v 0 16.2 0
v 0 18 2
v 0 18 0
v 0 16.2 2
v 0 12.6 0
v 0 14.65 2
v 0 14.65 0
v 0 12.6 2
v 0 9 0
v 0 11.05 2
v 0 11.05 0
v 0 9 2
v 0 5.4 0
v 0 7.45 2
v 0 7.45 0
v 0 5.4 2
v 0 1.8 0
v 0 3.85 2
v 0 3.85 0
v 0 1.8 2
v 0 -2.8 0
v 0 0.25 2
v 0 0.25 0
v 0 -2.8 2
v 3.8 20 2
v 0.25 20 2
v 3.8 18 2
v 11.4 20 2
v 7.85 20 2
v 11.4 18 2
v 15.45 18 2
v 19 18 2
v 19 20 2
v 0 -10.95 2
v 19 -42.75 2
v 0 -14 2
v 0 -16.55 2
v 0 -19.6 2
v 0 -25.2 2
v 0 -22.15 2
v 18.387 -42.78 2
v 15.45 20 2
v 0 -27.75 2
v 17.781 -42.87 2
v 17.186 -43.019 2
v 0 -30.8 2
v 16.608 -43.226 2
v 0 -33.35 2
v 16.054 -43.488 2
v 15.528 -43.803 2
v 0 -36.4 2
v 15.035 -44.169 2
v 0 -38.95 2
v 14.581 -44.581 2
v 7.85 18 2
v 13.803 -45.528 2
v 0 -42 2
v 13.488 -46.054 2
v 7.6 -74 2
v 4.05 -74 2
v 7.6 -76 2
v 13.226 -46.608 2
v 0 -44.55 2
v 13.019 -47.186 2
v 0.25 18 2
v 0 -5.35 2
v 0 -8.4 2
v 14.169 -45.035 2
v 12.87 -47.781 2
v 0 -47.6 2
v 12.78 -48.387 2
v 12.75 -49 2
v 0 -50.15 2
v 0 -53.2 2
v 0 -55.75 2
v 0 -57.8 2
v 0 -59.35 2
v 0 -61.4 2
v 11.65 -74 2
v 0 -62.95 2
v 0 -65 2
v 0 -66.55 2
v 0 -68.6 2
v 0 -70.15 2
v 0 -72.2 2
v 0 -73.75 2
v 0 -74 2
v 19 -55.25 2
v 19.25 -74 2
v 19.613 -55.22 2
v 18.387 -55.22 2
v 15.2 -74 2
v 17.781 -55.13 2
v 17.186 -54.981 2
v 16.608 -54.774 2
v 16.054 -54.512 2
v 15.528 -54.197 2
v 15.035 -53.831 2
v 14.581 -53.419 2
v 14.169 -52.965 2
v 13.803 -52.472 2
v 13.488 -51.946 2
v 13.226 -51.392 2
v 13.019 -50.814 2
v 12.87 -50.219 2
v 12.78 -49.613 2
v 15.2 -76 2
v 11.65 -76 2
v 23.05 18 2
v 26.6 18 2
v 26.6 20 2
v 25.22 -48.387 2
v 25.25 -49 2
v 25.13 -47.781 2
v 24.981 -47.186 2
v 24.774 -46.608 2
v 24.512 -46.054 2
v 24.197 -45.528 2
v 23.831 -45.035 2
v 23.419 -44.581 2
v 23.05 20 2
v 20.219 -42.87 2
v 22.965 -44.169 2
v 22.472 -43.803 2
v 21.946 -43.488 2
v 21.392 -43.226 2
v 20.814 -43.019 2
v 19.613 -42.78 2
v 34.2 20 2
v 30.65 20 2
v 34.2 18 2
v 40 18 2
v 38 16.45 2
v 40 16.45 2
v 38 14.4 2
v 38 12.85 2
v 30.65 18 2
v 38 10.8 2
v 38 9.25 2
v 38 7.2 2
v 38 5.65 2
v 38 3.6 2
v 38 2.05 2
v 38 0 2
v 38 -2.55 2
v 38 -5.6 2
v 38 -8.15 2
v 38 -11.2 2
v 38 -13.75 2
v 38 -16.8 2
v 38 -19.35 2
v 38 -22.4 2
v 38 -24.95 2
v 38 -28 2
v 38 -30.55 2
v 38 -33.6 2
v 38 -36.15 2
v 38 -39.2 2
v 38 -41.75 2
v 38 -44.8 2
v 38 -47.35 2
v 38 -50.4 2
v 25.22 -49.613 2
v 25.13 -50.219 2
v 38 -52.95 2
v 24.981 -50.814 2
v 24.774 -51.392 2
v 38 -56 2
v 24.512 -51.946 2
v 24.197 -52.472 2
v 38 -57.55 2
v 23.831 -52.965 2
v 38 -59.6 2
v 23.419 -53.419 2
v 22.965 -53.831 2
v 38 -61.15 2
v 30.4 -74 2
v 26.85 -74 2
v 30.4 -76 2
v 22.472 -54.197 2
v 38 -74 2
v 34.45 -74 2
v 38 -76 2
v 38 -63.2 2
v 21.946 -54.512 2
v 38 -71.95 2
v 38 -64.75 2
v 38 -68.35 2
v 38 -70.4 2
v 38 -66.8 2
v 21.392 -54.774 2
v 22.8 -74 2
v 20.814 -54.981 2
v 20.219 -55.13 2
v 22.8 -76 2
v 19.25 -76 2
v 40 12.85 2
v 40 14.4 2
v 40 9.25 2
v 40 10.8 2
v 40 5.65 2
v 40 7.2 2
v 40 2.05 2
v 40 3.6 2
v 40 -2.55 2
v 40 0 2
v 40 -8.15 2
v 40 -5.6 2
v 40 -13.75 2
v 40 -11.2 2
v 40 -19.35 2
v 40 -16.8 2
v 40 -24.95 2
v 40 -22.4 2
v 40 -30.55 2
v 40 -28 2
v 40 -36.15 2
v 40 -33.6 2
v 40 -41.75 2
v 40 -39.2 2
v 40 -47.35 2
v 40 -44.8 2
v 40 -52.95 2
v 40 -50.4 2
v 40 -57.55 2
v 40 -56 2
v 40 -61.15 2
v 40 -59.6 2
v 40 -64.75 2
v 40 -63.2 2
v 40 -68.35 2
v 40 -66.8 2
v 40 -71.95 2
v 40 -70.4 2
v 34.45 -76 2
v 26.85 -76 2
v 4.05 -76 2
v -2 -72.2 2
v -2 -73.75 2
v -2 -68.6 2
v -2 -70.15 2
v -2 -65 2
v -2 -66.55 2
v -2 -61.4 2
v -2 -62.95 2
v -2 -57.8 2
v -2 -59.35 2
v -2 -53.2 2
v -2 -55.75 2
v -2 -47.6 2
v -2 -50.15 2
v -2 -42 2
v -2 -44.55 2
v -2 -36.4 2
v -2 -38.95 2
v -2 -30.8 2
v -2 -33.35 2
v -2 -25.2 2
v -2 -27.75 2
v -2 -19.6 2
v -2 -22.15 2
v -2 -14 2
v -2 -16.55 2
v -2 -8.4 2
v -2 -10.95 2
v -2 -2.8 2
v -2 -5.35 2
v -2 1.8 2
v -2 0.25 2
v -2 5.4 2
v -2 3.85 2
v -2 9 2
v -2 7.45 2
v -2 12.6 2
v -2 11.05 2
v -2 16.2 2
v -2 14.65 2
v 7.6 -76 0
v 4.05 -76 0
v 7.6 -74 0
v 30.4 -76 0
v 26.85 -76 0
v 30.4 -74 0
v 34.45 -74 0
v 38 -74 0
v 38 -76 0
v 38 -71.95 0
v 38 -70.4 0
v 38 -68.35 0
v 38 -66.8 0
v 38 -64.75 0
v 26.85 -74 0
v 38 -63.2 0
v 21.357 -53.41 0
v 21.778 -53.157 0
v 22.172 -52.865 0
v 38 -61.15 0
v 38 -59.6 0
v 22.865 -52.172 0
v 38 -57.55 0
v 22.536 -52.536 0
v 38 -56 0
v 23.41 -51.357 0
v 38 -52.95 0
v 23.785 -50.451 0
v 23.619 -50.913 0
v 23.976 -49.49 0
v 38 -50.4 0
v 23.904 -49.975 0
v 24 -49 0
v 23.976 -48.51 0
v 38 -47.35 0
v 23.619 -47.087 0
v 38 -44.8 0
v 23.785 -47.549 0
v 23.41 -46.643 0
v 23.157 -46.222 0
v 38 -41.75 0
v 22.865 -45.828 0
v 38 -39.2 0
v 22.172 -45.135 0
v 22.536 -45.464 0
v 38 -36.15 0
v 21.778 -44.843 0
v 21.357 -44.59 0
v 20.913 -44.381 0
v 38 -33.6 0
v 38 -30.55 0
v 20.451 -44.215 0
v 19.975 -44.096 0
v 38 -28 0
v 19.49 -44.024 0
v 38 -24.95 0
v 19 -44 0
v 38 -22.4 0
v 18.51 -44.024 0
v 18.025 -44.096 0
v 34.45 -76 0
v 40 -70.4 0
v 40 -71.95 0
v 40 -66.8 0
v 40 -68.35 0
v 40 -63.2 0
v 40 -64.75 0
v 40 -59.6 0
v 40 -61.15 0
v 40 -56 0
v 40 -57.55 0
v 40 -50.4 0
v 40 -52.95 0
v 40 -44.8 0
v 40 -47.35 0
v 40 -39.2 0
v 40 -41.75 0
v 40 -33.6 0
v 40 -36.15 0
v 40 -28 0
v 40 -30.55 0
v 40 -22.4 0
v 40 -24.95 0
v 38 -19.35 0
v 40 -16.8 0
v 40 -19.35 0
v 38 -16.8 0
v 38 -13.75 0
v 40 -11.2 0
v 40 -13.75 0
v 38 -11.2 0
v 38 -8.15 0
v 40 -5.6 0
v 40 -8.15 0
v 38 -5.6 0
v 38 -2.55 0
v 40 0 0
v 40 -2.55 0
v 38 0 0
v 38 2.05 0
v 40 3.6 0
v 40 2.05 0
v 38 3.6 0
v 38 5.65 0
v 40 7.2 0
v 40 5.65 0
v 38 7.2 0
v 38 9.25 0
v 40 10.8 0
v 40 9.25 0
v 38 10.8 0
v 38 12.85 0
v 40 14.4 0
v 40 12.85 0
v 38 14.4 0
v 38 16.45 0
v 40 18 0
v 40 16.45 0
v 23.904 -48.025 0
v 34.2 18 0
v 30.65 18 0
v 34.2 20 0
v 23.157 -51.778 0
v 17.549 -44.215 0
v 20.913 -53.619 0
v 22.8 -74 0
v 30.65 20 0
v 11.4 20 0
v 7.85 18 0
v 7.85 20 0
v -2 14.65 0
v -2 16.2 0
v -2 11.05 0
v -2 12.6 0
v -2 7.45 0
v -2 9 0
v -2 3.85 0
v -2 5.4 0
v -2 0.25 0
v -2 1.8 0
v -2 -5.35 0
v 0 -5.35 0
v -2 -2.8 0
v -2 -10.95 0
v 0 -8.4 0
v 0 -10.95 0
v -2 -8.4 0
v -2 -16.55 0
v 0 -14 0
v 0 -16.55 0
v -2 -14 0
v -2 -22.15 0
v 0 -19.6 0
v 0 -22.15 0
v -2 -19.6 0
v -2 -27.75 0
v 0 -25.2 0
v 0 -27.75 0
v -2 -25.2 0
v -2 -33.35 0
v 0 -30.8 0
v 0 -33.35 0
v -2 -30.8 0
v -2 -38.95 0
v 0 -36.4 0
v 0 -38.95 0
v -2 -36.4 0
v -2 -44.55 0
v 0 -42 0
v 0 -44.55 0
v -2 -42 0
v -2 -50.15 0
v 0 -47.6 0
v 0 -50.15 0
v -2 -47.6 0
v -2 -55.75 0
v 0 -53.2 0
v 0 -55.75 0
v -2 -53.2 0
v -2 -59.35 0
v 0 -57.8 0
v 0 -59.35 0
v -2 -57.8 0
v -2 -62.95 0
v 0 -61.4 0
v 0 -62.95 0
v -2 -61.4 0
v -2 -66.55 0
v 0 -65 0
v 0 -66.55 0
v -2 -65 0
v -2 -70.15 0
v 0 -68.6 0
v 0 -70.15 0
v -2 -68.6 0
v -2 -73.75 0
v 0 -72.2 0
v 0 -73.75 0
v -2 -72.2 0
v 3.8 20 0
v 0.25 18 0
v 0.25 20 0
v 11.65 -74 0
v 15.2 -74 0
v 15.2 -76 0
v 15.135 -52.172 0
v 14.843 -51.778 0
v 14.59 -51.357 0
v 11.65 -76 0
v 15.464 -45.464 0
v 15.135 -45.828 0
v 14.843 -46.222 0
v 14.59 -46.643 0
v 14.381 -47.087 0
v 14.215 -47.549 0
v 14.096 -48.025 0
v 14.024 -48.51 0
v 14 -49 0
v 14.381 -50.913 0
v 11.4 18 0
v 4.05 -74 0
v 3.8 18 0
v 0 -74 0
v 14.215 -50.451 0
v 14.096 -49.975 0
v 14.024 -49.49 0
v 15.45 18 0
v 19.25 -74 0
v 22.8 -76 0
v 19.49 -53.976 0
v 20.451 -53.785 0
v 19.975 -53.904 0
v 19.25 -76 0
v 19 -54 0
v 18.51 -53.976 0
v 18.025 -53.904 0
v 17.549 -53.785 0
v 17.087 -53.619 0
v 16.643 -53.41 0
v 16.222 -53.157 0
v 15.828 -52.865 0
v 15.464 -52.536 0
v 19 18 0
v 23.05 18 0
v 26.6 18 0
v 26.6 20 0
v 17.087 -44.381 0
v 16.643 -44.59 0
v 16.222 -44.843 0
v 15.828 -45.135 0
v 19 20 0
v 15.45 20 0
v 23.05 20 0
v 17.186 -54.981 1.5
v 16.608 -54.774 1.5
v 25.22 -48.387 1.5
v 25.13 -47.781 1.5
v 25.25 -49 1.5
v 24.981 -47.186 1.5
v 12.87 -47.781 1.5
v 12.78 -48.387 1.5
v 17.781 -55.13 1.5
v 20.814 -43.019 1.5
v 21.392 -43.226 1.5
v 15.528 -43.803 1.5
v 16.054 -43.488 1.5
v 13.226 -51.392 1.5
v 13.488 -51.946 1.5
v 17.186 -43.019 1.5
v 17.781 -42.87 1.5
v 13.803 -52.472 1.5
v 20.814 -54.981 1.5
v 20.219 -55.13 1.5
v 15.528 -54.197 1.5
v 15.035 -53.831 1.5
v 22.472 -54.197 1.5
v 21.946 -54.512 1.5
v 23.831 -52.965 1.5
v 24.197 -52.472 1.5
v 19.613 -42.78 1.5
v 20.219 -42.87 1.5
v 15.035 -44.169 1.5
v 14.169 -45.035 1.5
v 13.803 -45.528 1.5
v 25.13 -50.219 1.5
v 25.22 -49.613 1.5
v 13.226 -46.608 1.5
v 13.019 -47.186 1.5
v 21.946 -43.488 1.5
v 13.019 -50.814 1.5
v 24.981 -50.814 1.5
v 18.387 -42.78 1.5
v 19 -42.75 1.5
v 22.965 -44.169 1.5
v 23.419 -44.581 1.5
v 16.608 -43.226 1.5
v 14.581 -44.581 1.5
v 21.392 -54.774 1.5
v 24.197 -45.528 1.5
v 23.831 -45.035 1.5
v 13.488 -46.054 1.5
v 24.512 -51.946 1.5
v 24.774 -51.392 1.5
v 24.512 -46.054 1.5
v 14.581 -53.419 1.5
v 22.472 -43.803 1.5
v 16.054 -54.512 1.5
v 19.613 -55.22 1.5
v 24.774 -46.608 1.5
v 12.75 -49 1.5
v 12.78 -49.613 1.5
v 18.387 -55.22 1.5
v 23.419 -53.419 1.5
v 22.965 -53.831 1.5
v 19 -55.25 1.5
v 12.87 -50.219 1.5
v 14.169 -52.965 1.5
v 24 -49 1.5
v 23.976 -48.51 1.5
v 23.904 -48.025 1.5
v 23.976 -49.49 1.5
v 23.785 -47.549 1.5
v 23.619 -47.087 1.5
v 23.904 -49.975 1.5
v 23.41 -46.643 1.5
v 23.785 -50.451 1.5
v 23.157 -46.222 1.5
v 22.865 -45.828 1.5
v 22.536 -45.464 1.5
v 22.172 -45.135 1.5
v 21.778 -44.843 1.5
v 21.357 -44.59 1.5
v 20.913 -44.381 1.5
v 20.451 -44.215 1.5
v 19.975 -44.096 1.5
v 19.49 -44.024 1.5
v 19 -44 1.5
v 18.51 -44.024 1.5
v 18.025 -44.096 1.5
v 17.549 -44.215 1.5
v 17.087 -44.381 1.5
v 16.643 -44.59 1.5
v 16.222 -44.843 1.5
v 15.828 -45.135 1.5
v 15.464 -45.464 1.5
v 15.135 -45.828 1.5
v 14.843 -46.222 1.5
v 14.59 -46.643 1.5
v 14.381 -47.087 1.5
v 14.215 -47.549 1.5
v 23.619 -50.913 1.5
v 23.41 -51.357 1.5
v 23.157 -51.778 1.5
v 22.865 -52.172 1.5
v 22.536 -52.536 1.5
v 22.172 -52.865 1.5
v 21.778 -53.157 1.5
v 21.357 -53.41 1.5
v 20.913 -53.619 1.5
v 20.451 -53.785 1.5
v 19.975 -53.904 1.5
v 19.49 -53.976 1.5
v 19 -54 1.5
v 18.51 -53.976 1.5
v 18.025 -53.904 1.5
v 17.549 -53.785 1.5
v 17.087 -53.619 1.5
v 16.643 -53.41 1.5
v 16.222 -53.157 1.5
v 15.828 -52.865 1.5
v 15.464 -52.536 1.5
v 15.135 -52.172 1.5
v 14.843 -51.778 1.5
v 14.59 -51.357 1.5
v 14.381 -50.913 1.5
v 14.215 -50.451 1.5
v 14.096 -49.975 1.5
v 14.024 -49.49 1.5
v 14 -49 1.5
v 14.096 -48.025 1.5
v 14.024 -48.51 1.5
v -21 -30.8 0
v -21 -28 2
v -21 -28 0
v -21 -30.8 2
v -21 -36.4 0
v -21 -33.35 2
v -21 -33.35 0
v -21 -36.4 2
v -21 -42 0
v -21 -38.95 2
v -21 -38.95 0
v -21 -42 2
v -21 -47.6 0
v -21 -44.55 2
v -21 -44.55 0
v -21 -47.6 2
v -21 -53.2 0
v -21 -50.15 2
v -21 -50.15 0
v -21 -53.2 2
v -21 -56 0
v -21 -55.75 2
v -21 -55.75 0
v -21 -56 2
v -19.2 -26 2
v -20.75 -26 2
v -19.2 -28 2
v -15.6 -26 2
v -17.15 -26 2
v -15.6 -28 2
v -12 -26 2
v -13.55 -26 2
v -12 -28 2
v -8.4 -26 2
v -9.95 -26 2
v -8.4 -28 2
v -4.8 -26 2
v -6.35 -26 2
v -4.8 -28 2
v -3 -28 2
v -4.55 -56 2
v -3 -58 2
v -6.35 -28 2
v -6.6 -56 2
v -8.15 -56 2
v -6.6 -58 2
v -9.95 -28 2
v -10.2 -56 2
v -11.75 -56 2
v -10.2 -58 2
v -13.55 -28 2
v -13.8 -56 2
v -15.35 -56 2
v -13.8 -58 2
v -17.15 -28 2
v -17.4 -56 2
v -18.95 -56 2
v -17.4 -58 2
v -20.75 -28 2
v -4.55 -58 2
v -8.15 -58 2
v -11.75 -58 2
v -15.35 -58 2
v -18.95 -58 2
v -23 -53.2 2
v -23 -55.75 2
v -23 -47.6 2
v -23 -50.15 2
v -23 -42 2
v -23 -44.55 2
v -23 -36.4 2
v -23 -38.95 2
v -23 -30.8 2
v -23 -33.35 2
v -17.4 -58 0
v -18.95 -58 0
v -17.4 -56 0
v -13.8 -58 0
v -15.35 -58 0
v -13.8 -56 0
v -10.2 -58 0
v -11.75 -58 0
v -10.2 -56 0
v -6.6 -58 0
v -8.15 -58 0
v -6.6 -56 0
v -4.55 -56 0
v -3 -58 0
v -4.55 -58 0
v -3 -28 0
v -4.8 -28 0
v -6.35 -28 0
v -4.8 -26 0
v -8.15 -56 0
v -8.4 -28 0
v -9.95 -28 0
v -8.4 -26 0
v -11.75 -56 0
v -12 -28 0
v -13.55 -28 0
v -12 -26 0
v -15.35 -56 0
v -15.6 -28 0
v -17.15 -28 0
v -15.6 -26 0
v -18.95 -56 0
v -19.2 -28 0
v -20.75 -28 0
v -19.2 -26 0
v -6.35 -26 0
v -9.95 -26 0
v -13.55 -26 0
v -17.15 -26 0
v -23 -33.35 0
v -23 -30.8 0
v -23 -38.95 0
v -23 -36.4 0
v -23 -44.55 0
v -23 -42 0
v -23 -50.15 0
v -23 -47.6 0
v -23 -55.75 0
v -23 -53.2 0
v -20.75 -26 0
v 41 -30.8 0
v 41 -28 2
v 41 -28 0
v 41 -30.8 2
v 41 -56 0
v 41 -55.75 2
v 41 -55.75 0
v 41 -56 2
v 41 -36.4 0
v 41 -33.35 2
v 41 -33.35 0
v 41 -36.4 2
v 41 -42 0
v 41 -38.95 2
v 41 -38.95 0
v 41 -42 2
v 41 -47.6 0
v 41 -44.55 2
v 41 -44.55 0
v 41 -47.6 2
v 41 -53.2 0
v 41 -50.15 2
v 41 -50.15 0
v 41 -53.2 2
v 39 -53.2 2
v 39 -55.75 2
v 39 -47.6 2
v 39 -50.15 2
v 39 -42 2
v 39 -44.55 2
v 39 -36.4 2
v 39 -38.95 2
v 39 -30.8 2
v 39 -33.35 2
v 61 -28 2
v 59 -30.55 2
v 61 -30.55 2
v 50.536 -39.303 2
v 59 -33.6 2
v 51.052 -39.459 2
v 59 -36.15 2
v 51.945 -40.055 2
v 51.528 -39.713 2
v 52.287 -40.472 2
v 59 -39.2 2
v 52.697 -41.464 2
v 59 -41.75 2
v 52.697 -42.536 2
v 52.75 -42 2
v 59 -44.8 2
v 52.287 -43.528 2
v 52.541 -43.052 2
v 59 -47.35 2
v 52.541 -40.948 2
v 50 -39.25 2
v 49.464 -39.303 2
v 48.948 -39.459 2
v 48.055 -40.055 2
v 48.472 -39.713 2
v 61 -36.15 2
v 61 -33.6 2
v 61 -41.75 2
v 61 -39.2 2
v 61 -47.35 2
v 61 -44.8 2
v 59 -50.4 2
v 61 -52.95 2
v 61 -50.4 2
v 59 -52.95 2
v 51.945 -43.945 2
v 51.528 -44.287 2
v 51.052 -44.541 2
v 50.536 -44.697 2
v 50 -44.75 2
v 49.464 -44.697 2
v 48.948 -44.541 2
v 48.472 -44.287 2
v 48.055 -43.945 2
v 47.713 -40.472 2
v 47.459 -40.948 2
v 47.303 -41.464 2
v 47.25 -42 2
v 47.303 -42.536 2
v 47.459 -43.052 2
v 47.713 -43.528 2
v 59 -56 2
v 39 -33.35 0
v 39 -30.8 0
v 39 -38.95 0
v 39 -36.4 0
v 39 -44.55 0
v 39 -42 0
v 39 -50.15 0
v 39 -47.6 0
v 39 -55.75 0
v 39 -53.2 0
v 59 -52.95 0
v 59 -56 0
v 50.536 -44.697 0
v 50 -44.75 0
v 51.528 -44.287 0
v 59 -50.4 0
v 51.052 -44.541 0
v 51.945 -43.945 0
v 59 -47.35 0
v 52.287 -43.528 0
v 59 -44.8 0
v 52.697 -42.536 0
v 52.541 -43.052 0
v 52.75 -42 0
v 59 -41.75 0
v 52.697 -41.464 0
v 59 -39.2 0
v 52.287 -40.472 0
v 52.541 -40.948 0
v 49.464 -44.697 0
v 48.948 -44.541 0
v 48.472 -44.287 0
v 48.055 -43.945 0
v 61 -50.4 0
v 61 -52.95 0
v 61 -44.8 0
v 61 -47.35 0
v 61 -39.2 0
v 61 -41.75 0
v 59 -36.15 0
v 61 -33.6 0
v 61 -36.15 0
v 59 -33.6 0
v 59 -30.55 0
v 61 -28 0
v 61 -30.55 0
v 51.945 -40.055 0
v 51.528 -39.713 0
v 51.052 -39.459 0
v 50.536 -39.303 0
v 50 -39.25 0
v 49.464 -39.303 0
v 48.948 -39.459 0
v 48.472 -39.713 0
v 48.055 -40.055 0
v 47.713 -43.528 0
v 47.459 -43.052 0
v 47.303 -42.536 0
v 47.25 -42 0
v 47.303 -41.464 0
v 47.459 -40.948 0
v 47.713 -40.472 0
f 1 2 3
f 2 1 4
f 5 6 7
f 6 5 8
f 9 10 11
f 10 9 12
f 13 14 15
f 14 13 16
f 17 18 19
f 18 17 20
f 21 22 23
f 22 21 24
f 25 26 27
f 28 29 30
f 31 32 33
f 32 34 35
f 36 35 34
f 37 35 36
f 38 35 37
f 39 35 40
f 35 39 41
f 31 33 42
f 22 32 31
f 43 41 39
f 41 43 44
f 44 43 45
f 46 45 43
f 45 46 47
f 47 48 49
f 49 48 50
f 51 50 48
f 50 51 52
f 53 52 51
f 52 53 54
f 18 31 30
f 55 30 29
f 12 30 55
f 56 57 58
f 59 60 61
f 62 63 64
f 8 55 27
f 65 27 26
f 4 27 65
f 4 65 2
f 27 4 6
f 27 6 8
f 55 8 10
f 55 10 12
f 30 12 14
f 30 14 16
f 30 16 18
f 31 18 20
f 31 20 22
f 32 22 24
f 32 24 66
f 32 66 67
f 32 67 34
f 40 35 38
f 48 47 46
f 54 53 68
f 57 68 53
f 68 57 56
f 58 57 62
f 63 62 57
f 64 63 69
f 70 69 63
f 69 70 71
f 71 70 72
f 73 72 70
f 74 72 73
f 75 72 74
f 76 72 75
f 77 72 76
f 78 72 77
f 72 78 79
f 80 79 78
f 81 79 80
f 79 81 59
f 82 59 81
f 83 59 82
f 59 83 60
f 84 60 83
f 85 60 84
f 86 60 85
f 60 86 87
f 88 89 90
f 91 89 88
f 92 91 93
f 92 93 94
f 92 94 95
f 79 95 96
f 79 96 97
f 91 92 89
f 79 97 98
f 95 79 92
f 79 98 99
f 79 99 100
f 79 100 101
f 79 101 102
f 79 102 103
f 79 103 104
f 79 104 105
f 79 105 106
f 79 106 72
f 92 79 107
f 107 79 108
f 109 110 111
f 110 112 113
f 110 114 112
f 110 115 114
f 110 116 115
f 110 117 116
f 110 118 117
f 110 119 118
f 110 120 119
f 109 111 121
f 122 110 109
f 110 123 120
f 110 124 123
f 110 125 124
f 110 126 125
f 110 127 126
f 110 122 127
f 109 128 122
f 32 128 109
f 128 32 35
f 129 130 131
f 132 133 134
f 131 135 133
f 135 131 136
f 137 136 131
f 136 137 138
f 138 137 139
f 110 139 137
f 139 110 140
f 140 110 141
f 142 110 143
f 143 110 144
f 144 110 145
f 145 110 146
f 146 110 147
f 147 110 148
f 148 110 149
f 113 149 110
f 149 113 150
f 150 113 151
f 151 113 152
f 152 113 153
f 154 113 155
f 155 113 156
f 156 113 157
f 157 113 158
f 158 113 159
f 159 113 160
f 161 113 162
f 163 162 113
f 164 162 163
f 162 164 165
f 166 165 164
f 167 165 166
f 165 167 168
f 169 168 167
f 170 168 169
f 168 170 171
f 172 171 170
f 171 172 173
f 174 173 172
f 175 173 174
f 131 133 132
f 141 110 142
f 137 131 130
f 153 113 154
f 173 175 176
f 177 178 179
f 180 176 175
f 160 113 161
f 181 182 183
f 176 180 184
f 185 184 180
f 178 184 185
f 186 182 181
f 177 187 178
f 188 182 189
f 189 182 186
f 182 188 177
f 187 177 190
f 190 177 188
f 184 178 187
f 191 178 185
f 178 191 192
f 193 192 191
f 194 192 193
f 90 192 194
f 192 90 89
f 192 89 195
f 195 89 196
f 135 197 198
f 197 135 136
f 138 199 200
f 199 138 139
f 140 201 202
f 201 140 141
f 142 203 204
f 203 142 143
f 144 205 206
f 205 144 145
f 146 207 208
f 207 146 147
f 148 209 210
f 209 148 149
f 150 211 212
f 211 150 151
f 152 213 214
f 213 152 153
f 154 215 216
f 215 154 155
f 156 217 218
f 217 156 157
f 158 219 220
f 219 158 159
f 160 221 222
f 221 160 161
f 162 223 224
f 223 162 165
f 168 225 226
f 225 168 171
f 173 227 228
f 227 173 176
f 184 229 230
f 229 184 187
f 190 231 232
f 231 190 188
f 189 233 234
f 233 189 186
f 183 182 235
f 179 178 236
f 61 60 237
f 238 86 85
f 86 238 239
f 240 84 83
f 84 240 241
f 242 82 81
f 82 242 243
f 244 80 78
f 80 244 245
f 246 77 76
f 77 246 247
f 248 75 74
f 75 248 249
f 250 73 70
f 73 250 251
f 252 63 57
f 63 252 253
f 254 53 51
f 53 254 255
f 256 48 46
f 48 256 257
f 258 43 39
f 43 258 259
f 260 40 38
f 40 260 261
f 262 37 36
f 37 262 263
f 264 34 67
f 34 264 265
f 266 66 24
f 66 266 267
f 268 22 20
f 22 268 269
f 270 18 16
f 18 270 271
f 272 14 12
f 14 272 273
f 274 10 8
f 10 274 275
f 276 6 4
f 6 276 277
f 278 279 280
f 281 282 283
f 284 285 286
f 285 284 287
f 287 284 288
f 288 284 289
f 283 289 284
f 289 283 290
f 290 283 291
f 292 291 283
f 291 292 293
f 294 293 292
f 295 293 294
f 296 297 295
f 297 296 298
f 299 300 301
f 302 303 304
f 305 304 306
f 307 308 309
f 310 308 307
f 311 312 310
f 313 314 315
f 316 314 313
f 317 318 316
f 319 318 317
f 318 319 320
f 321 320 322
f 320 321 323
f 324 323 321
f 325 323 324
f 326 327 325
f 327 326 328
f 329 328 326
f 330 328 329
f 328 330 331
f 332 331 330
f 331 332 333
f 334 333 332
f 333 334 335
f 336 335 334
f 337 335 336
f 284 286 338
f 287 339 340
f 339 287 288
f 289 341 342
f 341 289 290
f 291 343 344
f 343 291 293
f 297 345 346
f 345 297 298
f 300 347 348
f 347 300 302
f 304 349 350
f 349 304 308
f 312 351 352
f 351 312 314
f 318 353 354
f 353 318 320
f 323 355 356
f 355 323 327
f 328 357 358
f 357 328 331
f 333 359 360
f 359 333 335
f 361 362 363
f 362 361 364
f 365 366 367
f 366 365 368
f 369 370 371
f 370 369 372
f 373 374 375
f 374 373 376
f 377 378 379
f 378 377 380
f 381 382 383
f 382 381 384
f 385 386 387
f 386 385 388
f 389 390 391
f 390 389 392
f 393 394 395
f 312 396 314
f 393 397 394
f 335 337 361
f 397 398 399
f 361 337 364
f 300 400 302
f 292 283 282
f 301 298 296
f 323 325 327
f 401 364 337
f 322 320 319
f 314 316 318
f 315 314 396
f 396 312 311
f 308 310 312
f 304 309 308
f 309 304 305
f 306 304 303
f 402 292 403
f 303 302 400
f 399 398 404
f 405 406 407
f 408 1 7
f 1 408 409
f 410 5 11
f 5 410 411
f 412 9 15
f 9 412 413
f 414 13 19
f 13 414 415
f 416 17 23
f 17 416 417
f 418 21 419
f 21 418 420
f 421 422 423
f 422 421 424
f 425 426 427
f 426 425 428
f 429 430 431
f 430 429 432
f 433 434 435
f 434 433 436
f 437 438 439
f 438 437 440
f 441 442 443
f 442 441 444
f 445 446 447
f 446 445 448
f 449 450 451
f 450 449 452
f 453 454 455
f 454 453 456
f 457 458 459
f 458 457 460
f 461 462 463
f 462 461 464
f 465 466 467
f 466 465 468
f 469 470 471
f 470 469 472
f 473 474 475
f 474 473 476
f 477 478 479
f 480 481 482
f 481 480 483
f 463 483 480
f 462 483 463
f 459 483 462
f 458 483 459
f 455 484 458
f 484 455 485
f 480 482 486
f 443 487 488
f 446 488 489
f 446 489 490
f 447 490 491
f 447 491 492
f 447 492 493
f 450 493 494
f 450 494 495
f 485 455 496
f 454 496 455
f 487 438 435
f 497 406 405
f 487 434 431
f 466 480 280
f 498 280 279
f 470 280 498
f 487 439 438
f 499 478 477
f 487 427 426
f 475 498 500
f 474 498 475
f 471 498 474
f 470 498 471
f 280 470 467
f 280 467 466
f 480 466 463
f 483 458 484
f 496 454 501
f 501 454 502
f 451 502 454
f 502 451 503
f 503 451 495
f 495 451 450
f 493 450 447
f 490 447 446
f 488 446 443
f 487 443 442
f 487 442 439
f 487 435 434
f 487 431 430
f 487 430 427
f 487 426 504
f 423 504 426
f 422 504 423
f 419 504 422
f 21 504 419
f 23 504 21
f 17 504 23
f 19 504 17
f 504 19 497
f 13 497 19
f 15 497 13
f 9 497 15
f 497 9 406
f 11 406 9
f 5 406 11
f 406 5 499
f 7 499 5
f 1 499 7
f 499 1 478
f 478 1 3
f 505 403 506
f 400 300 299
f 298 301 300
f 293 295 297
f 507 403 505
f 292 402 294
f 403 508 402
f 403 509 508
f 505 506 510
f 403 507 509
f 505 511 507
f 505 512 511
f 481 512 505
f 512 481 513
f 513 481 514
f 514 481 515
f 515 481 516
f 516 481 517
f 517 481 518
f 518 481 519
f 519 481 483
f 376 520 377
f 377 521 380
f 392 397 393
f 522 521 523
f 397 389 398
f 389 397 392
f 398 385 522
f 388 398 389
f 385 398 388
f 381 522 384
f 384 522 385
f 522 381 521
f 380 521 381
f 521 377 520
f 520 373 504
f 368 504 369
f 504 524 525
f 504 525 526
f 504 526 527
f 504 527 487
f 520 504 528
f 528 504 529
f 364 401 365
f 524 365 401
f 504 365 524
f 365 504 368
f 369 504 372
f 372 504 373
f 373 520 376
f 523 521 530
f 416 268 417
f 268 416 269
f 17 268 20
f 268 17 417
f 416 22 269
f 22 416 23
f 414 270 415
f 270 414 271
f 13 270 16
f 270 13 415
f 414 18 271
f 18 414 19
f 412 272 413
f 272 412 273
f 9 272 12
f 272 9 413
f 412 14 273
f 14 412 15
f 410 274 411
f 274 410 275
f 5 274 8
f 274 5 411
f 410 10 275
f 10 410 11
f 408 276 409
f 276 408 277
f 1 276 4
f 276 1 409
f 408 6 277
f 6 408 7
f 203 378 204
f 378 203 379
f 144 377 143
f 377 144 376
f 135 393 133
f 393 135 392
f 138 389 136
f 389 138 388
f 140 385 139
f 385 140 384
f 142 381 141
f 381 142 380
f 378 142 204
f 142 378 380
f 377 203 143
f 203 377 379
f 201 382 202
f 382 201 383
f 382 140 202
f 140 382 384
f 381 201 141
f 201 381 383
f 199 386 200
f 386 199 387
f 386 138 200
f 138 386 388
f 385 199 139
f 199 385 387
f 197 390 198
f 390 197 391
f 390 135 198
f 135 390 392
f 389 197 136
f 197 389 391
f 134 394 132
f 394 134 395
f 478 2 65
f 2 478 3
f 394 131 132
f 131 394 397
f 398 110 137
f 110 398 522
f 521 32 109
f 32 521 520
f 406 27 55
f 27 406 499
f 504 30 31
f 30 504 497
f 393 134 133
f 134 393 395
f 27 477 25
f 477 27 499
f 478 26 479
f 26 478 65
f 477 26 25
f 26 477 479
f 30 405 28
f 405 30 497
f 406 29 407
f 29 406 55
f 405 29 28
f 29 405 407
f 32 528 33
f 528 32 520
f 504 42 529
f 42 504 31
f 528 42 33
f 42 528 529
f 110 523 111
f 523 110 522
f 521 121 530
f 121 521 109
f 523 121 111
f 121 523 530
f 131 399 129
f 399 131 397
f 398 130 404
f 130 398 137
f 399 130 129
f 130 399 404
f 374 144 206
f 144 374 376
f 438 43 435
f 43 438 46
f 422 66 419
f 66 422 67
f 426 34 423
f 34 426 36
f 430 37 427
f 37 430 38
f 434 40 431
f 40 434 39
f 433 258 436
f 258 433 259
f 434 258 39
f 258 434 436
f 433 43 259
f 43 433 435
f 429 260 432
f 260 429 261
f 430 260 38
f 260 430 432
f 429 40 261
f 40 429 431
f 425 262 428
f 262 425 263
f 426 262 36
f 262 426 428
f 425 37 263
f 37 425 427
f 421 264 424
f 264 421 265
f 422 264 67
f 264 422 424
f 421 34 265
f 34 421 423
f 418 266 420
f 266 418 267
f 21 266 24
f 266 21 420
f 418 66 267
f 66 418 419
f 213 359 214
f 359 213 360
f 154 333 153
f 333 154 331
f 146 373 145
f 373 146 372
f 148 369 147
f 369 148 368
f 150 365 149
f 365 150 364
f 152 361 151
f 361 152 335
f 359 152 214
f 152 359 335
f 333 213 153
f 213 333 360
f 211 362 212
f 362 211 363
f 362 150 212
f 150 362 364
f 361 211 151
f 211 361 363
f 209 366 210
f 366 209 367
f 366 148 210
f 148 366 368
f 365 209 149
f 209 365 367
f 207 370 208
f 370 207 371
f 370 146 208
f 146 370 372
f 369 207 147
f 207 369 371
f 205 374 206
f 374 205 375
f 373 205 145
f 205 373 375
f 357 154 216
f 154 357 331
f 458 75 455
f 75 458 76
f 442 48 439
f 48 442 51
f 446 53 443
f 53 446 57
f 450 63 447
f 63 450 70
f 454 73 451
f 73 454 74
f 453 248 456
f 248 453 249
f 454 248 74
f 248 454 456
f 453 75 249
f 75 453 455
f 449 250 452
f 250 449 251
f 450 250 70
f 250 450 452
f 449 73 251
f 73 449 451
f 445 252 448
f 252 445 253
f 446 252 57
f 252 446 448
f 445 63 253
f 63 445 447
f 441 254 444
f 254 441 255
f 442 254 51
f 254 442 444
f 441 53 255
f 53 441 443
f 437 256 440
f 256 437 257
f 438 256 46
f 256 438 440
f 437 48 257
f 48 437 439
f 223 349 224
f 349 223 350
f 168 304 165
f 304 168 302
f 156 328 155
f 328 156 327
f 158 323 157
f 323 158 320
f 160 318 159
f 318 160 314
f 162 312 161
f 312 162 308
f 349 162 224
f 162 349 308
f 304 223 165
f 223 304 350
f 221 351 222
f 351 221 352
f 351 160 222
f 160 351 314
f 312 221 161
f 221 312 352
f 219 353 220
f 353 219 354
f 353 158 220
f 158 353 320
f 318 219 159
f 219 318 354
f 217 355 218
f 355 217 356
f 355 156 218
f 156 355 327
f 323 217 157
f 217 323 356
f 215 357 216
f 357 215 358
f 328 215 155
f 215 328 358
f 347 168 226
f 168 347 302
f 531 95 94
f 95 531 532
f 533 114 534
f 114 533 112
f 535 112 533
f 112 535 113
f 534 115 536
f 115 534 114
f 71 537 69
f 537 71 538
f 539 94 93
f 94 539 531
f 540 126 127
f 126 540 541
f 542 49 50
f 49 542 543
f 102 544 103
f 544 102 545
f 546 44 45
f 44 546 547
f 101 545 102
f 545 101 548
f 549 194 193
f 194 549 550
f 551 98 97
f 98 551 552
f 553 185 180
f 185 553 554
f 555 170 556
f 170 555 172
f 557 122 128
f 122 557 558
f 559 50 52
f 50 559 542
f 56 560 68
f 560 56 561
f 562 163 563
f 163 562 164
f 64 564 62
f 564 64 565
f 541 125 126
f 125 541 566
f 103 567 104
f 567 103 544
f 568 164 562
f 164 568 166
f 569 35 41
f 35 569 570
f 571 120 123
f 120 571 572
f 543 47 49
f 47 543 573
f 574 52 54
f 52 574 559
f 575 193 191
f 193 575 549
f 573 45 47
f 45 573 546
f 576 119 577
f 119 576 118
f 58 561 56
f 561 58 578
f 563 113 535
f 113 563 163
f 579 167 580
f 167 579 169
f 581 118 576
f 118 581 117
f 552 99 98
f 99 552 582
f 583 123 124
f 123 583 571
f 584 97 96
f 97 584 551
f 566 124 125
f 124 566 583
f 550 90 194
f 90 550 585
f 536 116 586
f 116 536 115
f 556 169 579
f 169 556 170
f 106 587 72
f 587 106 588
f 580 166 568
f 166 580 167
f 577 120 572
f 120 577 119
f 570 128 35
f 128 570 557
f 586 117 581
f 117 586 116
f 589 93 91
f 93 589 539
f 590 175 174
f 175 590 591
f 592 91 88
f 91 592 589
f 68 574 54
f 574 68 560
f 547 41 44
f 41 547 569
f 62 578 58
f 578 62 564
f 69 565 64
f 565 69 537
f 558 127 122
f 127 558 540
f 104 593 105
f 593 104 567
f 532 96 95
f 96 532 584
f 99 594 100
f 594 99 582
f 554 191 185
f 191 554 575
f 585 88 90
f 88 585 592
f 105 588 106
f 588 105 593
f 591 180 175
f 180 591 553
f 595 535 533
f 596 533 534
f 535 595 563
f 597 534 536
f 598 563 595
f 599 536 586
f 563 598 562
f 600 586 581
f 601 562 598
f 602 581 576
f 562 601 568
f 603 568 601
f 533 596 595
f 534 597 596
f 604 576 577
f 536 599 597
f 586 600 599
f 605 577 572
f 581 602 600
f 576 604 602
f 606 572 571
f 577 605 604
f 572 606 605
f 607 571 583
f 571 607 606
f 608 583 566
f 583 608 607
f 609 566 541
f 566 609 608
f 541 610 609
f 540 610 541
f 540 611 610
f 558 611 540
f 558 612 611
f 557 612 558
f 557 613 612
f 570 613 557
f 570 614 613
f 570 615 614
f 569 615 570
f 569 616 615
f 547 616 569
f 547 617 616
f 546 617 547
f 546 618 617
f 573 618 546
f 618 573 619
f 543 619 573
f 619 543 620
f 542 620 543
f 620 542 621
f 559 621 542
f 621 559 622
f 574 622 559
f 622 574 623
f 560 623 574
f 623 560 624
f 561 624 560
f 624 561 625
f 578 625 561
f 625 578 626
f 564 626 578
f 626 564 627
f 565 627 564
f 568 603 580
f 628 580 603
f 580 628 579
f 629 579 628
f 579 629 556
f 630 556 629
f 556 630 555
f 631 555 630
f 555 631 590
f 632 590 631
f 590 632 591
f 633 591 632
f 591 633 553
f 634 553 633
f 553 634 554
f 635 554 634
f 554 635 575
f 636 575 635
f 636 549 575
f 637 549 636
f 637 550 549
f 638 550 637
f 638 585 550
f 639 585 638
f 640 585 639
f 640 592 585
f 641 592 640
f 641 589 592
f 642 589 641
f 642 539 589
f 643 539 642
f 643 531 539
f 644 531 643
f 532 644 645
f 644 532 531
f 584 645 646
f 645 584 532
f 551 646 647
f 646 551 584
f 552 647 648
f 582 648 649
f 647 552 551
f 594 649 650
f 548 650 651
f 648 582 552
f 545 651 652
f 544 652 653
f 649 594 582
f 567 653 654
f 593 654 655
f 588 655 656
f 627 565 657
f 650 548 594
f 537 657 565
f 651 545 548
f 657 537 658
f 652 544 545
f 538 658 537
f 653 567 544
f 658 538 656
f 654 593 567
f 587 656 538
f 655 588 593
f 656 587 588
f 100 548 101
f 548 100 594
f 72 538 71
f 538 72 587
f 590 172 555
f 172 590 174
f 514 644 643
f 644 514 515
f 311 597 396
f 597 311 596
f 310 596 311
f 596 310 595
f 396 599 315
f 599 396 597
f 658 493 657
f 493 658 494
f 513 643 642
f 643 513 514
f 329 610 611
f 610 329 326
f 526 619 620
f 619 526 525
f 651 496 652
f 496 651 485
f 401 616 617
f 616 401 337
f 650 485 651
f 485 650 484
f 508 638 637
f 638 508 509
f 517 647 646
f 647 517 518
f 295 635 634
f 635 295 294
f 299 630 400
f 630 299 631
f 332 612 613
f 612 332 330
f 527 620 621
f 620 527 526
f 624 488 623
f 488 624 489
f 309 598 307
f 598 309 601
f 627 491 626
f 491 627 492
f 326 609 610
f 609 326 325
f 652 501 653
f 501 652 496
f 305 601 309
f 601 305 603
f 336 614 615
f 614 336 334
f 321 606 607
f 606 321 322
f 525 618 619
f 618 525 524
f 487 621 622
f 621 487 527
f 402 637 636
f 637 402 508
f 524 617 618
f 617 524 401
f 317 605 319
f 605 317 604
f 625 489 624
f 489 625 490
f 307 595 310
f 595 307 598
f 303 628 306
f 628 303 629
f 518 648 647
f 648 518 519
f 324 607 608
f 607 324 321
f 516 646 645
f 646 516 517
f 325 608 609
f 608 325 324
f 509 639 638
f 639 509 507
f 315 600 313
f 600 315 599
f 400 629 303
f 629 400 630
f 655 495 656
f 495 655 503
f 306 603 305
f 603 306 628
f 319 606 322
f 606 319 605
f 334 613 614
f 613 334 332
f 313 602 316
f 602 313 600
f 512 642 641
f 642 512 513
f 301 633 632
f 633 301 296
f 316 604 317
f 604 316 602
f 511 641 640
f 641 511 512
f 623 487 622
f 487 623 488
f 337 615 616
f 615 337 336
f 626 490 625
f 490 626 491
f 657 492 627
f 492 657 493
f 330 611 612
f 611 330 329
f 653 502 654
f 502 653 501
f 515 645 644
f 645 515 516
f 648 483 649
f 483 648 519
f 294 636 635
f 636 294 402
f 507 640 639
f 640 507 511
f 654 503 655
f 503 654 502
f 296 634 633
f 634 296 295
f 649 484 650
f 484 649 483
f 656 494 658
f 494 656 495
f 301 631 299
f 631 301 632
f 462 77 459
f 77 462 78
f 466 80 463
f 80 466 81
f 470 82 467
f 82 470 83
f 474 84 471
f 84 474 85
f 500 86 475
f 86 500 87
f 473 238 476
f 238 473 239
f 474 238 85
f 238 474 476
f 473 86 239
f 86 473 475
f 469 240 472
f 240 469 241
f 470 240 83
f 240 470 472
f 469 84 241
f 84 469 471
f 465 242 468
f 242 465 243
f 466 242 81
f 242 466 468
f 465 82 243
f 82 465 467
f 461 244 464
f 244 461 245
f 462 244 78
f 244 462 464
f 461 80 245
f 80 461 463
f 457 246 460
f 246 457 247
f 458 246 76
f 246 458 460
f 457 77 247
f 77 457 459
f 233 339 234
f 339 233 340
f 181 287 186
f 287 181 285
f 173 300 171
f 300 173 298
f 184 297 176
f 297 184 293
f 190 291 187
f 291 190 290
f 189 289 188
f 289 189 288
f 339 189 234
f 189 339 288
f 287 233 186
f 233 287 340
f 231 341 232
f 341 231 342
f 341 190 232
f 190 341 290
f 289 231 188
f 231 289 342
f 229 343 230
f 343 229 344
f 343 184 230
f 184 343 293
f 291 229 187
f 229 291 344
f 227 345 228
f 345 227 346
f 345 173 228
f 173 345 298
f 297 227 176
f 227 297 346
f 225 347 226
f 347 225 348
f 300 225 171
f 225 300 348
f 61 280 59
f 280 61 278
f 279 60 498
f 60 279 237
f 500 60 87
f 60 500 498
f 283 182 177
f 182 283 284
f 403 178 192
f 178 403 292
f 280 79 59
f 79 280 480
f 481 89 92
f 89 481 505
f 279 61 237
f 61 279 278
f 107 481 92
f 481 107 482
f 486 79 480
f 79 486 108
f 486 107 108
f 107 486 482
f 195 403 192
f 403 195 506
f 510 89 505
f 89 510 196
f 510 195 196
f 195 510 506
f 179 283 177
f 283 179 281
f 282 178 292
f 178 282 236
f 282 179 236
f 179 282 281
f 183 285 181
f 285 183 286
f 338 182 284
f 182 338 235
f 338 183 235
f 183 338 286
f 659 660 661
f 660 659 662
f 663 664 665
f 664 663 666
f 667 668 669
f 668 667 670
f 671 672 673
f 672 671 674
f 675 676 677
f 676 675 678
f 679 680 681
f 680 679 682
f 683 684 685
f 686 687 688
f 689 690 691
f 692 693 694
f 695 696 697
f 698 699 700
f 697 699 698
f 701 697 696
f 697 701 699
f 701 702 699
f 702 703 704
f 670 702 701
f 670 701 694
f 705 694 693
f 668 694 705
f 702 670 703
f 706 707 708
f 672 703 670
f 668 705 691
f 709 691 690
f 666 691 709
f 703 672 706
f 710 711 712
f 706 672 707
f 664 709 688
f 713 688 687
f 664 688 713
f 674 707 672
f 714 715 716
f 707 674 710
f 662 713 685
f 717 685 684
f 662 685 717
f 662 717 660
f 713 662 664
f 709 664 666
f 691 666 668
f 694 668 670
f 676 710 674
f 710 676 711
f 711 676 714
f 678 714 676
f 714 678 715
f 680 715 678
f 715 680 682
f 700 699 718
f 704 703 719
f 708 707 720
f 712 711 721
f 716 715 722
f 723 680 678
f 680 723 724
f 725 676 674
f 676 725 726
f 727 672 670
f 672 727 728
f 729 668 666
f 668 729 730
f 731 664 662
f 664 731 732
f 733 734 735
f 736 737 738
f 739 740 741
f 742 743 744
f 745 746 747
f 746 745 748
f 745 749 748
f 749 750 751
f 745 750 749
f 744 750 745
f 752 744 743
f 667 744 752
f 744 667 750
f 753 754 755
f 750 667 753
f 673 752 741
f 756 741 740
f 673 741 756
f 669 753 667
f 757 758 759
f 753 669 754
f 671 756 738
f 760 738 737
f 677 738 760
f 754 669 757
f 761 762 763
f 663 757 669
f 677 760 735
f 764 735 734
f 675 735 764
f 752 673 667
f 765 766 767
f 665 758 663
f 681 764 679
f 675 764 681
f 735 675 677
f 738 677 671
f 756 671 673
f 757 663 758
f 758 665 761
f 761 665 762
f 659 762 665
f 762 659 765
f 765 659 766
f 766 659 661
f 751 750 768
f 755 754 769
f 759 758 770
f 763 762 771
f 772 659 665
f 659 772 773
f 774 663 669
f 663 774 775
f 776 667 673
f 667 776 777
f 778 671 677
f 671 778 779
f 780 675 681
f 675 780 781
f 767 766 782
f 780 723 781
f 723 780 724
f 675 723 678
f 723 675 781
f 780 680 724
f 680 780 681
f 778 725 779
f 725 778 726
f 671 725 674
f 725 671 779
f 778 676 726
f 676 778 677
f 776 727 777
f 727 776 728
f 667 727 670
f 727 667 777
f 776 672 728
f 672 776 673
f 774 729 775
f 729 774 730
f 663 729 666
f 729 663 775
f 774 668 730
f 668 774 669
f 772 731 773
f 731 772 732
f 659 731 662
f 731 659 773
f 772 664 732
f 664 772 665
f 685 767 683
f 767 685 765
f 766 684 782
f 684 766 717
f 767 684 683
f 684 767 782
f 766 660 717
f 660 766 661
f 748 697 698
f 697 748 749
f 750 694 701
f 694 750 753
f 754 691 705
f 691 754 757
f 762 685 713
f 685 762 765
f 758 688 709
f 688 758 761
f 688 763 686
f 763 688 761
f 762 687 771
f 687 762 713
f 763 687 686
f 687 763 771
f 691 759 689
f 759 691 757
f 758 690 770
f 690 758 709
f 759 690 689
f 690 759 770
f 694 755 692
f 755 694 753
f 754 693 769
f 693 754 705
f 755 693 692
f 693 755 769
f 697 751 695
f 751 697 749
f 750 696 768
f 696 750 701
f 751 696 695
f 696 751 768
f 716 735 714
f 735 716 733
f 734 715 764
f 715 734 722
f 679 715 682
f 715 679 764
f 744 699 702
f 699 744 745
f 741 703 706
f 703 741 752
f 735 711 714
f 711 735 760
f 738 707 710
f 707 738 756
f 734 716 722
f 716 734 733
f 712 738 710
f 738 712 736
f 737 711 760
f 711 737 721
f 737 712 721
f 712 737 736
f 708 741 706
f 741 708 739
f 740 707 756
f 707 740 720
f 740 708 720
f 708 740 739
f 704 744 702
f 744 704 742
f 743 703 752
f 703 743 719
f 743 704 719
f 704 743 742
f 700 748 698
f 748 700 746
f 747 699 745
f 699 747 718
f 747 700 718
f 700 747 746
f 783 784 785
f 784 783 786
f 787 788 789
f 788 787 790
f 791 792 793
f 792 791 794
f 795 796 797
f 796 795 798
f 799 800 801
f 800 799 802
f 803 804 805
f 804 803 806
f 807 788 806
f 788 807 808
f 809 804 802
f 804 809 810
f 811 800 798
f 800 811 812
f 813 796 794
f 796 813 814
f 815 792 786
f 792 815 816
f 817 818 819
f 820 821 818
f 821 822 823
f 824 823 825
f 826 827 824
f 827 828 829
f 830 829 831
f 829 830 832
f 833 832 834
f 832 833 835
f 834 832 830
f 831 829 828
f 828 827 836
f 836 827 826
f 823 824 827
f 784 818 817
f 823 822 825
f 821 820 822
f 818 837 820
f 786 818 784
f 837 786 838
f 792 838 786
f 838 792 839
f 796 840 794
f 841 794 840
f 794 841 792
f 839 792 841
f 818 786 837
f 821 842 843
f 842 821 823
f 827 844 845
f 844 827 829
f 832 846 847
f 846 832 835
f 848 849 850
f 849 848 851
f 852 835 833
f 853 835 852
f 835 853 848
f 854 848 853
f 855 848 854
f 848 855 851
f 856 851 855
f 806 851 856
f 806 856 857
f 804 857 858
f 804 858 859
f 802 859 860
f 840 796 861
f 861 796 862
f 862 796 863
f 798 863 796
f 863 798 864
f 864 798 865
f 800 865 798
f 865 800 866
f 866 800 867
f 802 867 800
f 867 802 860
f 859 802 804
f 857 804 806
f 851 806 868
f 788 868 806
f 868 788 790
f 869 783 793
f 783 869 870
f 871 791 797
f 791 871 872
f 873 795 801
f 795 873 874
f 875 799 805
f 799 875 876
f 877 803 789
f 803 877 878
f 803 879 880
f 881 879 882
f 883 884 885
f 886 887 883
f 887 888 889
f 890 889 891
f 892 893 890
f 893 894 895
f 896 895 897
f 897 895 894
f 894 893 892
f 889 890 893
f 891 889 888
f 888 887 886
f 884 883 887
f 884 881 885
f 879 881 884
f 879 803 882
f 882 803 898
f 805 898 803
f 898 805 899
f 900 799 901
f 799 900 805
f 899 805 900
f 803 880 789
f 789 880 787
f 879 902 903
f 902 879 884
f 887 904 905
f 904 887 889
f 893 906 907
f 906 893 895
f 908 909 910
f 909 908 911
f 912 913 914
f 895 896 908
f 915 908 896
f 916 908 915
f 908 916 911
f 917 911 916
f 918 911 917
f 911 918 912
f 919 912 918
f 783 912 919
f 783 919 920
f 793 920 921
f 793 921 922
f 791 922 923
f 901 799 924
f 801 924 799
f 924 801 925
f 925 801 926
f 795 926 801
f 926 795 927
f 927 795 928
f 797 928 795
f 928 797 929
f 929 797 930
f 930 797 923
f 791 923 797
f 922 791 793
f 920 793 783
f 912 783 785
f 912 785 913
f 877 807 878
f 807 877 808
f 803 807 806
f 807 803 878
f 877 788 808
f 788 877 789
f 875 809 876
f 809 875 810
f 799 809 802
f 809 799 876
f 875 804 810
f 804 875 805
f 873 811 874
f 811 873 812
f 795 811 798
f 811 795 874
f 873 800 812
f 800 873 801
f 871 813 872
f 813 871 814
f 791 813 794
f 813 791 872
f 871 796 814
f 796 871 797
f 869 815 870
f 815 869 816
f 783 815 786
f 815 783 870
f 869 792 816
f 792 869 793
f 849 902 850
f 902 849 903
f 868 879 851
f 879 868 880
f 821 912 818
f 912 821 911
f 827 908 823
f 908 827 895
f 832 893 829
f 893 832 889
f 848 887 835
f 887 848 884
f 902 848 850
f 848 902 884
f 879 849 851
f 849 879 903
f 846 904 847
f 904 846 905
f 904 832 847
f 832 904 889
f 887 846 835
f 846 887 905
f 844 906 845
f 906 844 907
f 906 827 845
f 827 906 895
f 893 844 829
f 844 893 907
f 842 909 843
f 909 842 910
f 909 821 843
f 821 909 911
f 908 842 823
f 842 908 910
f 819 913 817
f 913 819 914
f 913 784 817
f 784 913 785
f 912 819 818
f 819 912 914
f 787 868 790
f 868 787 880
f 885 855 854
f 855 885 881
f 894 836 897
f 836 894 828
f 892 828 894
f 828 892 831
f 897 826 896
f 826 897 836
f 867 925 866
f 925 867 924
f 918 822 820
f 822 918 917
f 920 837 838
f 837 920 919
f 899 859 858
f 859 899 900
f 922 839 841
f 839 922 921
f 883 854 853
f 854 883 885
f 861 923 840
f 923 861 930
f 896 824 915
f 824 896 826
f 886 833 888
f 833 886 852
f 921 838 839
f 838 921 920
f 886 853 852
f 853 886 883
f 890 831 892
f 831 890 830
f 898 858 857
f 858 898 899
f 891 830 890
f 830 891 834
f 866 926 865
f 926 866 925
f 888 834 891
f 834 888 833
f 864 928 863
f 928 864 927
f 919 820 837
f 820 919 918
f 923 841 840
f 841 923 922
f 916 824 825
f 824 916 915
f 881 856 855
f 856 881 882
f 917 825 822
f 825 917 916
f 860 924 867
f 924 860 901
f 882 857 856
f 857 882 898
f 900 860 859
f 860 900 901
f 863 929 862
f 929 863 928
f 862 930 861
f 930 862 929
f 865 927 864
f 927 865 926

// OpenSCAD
// Made by Claude. I, Richel, think it is quite a bad design :-/
//
// === Dimensions ===
outer_width     = 40; // mm  (X when assembled)
outer_depth     = 30; // mm  (Y when assembled)
outer_height    = 20; // mm  (Z when assembled)
wall_thickness  = 2;  // mm
inner_width     = outer_width  - wall_thickness;
inner_depth     = outer_depth  - wall_thickness;
inner_height    = outer_height - wall_thickness;

n_teeth         = 10;
teeth_air       = 0.25; // gap per tooth side, mm
piezo_diameter  = 12;   // mm
piezo_radius    = piezo_diameter / 2;
cable_diameter  = 5;    // mm
cable_radius    = cable_diameter / 2;

spacing         = 3;    // gap between unconnected panels in the flat layout

//
// Panel roles (assembled box):
//   1 = bottom   (has piezo cutout — glued first while flat, fully accessible)
//   2 = left side
//   3 = top
//   4 = right side (has cable hole at bottom edge when assembled)
//   5 = front
//   6 = back
//
// New flat layout — connected vertical strip + wings:
//
//         [5 front]       w×h
//         [3 top  ]       w×d
//   [2 L] [1 botm ] [4 R] h×d | w×d | h×d
//         [6 back ]       w×h
//
// Panels 5-3-1-6 are directly connected (share an edge, no gap).
// Panels 2 and 4 sit beside panel 1 with a small spacing gap
// (they still need teeth on that edge to lock in).
//
// Assembly order:
//   1. Glue piezo to panel 1 (bottom) while it lies flat — easy access.
//   2. Fold 5-3-1-6 strip into a U, add panel 2 and 4 as sides, lastly close.
//   3. Route cable through hole in panel 4 (right side, near bottom edge).

// -----------------------------------------------------------------------
// Helpers
// -----------------------------------------------------------------------

// Teeth along the LEFT edge of a panel (pointing left, every other slot)
module teeth_left(dx, dy, nt) {
    yt = dy / nt;
    for (i = [0 : nt/2 - 1])
        translate([-wall_thickness, i * yt * 2 + teeth_air, 0])
            cube([wall_thickness, yt - teeth_air, wall_thickness]);
}

// Teeth along the RIGHT edge
module teeth_right(dx, dy, nt) {
    yt = dy / nt;
    for (i = [0 : nt/2 - 1])
        translate([dx, yt + i * yt * 2 + teeth_air, 0])
            cube([wall_thickness, yt - teeth_air, wall_thickness]);
}

// Teeth along the TOP edge (pointing up)
module teeth_top(dx, dy, nt) {
    xt = dx / nt;
    for (i = [0 : nt/2 - 1])
        translate([i * xt * 2 + teeth_air, dy, 0])
            cube([xt - teeth_air, wall_thickness, wall_thickness]);
}

// Teeth along the BOTTOM edge (pointing down)
module teeth_bottom(dx, dy, nt) {
    xt = dx / nt;
    for (i = [0 : nt/2 - 1])
        translate([xt + i * xt * 2 + teeth_air, -wall_thickness, 0])
            cube([xt - teeth_air, wall_thickness, wall_thickness]);
}

// -----------------------------------------------------------------------
// Generic panel: face + selective teeth on each of the 4 edges.
// Flags: tl=left, tr=right, tt=top, tb=bottom  (1=draw teeth, 0=plain edge)
// -----------------------------------------------------------------------
module panel(dx, dy, nt, tl=1, tr=1, tt=1, tb=1) {
    cube([dx, dy, wall_thickness]);
    if (tl) teeth_left(dx, dy, nt);
    if (tr) teeth_right(dx, dy, nt);
    if (tt) teeth_top(dx, dy, nt);
    if (tb) teeth_bottom(dx, dy, nt);
}

// -----------------------------------------------------------------------
// Panel 1 — bottom, with piezo mounting recess + through-hole
// Piezo sits centred in X, near the front in Y (accessible, away from cable)
// -----------------------------------------------------------------------
module panel_bottom() {
    difference() {
        panel(inner_width, inner_depth, n_teeth, tl=1, tr=1, tt=0, tb=0);
        // Recess ring: lets the piezo lip sit flush
        translate([inner_width/2, inner_depth/4, wall_thickness - 0.5])
            cylinder(h=1.5, r=piezo_radius + teeth_air, $fn=64);
        // Through-hole: sound can pass / wire can be routed if needed
        translate([inner_width/2, inner_depth/4, -1])
            cylinder(h=wall_thickness + 2, r=piezo_radius - 1, $fn=64);
    }
}

// -----------------------------------------------------------------------
// Panel 4 — right side, cable hole near the bottom-assembled edge
// -----------------------------------------------------------------------
module panel_right() {
    difference() {
        panel(inner_height, inner_depth, n_teeth, tl=1, tr=1, tt=0, tb=0);
        // Cable hole: centred in depth, close to the bottom edge (y≈cable_radius+wt)
        translate([inner_height/2, inner_depth/2, -1])
            cylinder(h=wall_thickness + 2, r=cable_radius + teeth_air, $fn=32);
    }
}

// -----------------------------------------------------------------------
// Flat layout
//
// The strip 5→3→1→6 is laid out top-to-bottom, connected (no gap).
// Panel widths in the strip direction:
//   5 (front): inner_height tall
//   3 (top)  : inner_depth tall
//   1 (botm) : inner_depth tall
//   6 (back) : inner_height tall
//
// Panels 2 (left) and 4 (right) sit beside panel 1 with spacing.
// -----------------------------------------------------------------------

// Origin of the strip: panel 5 starts at (0,0)
p5_x = 0;
p5_y = 0;

p3_x = p5_x;
p3_y = p5_y - inner_depth;        // directly below panel 5 (front)
// (no gap — shared edge)

p1_x = p3_x;
p1_y = p3_y - inner_depth;        // directly below panel 3 (top)

p6_x = p1_x;
p6_y = p1_y - inner_height;       // directly below panel 1 (bottom)

// Left panel (2) beside panel 1
p2_x = p1_x - inner_height - spacing;
p2_y = p1_y;

// Right panel (4) beside panel 1
p4_x = p1_x + inner_width + spacing;
p4_y = p1_y;

//
//        [5 front  ] — top of strip, free top/left/right teeth
//        [3 top    ] — free left/right teeth
//  [2 L] [1 bottom ] [4 R]
//        [6 back   ] — free left/right/bottom teeth
//

// --- Panel 5: front  (w × h), free on left, right, top ---
translate([p5_x, p5_y, 0])
    panel(inner_width, inner_height, n_teeth, tl=1, tr=1, tt=1, tb=0);

// --- Panel 3: top  (w × d), free on left, right ---
translate([p3_x, p3_y, 0])
    panel(inner_width, inner_depth, n_teeth, tl=1, tr=1, tt=0, tb=0);

// --- Panel 1: bottom (w × d), piezo cutout, free on left, right ---
translate([p1_x, p1_y, 0])
    panel_bottom();

// --- Panel 6: back (w × h), free on left, right, bottom ---
translate([p6_x, p6_y, 0])
    panel(inner_width, inner_height, n_teeth, tl=1, tr=1, tt=0, tb=1);

// --- Panel 2: left side (h × d), free on left, top, bottom ---
translate([p2_x, p2_y, 0])
    panel(inner_height, inner_depth, n_teeth, tl=1, tr=0, tt=1, tb=1);

// --- Panel 4: right side (h × d), cable hole, free on right, top, bottom ---
translate([p4_x, p4_y, 0])
    panel_right();
